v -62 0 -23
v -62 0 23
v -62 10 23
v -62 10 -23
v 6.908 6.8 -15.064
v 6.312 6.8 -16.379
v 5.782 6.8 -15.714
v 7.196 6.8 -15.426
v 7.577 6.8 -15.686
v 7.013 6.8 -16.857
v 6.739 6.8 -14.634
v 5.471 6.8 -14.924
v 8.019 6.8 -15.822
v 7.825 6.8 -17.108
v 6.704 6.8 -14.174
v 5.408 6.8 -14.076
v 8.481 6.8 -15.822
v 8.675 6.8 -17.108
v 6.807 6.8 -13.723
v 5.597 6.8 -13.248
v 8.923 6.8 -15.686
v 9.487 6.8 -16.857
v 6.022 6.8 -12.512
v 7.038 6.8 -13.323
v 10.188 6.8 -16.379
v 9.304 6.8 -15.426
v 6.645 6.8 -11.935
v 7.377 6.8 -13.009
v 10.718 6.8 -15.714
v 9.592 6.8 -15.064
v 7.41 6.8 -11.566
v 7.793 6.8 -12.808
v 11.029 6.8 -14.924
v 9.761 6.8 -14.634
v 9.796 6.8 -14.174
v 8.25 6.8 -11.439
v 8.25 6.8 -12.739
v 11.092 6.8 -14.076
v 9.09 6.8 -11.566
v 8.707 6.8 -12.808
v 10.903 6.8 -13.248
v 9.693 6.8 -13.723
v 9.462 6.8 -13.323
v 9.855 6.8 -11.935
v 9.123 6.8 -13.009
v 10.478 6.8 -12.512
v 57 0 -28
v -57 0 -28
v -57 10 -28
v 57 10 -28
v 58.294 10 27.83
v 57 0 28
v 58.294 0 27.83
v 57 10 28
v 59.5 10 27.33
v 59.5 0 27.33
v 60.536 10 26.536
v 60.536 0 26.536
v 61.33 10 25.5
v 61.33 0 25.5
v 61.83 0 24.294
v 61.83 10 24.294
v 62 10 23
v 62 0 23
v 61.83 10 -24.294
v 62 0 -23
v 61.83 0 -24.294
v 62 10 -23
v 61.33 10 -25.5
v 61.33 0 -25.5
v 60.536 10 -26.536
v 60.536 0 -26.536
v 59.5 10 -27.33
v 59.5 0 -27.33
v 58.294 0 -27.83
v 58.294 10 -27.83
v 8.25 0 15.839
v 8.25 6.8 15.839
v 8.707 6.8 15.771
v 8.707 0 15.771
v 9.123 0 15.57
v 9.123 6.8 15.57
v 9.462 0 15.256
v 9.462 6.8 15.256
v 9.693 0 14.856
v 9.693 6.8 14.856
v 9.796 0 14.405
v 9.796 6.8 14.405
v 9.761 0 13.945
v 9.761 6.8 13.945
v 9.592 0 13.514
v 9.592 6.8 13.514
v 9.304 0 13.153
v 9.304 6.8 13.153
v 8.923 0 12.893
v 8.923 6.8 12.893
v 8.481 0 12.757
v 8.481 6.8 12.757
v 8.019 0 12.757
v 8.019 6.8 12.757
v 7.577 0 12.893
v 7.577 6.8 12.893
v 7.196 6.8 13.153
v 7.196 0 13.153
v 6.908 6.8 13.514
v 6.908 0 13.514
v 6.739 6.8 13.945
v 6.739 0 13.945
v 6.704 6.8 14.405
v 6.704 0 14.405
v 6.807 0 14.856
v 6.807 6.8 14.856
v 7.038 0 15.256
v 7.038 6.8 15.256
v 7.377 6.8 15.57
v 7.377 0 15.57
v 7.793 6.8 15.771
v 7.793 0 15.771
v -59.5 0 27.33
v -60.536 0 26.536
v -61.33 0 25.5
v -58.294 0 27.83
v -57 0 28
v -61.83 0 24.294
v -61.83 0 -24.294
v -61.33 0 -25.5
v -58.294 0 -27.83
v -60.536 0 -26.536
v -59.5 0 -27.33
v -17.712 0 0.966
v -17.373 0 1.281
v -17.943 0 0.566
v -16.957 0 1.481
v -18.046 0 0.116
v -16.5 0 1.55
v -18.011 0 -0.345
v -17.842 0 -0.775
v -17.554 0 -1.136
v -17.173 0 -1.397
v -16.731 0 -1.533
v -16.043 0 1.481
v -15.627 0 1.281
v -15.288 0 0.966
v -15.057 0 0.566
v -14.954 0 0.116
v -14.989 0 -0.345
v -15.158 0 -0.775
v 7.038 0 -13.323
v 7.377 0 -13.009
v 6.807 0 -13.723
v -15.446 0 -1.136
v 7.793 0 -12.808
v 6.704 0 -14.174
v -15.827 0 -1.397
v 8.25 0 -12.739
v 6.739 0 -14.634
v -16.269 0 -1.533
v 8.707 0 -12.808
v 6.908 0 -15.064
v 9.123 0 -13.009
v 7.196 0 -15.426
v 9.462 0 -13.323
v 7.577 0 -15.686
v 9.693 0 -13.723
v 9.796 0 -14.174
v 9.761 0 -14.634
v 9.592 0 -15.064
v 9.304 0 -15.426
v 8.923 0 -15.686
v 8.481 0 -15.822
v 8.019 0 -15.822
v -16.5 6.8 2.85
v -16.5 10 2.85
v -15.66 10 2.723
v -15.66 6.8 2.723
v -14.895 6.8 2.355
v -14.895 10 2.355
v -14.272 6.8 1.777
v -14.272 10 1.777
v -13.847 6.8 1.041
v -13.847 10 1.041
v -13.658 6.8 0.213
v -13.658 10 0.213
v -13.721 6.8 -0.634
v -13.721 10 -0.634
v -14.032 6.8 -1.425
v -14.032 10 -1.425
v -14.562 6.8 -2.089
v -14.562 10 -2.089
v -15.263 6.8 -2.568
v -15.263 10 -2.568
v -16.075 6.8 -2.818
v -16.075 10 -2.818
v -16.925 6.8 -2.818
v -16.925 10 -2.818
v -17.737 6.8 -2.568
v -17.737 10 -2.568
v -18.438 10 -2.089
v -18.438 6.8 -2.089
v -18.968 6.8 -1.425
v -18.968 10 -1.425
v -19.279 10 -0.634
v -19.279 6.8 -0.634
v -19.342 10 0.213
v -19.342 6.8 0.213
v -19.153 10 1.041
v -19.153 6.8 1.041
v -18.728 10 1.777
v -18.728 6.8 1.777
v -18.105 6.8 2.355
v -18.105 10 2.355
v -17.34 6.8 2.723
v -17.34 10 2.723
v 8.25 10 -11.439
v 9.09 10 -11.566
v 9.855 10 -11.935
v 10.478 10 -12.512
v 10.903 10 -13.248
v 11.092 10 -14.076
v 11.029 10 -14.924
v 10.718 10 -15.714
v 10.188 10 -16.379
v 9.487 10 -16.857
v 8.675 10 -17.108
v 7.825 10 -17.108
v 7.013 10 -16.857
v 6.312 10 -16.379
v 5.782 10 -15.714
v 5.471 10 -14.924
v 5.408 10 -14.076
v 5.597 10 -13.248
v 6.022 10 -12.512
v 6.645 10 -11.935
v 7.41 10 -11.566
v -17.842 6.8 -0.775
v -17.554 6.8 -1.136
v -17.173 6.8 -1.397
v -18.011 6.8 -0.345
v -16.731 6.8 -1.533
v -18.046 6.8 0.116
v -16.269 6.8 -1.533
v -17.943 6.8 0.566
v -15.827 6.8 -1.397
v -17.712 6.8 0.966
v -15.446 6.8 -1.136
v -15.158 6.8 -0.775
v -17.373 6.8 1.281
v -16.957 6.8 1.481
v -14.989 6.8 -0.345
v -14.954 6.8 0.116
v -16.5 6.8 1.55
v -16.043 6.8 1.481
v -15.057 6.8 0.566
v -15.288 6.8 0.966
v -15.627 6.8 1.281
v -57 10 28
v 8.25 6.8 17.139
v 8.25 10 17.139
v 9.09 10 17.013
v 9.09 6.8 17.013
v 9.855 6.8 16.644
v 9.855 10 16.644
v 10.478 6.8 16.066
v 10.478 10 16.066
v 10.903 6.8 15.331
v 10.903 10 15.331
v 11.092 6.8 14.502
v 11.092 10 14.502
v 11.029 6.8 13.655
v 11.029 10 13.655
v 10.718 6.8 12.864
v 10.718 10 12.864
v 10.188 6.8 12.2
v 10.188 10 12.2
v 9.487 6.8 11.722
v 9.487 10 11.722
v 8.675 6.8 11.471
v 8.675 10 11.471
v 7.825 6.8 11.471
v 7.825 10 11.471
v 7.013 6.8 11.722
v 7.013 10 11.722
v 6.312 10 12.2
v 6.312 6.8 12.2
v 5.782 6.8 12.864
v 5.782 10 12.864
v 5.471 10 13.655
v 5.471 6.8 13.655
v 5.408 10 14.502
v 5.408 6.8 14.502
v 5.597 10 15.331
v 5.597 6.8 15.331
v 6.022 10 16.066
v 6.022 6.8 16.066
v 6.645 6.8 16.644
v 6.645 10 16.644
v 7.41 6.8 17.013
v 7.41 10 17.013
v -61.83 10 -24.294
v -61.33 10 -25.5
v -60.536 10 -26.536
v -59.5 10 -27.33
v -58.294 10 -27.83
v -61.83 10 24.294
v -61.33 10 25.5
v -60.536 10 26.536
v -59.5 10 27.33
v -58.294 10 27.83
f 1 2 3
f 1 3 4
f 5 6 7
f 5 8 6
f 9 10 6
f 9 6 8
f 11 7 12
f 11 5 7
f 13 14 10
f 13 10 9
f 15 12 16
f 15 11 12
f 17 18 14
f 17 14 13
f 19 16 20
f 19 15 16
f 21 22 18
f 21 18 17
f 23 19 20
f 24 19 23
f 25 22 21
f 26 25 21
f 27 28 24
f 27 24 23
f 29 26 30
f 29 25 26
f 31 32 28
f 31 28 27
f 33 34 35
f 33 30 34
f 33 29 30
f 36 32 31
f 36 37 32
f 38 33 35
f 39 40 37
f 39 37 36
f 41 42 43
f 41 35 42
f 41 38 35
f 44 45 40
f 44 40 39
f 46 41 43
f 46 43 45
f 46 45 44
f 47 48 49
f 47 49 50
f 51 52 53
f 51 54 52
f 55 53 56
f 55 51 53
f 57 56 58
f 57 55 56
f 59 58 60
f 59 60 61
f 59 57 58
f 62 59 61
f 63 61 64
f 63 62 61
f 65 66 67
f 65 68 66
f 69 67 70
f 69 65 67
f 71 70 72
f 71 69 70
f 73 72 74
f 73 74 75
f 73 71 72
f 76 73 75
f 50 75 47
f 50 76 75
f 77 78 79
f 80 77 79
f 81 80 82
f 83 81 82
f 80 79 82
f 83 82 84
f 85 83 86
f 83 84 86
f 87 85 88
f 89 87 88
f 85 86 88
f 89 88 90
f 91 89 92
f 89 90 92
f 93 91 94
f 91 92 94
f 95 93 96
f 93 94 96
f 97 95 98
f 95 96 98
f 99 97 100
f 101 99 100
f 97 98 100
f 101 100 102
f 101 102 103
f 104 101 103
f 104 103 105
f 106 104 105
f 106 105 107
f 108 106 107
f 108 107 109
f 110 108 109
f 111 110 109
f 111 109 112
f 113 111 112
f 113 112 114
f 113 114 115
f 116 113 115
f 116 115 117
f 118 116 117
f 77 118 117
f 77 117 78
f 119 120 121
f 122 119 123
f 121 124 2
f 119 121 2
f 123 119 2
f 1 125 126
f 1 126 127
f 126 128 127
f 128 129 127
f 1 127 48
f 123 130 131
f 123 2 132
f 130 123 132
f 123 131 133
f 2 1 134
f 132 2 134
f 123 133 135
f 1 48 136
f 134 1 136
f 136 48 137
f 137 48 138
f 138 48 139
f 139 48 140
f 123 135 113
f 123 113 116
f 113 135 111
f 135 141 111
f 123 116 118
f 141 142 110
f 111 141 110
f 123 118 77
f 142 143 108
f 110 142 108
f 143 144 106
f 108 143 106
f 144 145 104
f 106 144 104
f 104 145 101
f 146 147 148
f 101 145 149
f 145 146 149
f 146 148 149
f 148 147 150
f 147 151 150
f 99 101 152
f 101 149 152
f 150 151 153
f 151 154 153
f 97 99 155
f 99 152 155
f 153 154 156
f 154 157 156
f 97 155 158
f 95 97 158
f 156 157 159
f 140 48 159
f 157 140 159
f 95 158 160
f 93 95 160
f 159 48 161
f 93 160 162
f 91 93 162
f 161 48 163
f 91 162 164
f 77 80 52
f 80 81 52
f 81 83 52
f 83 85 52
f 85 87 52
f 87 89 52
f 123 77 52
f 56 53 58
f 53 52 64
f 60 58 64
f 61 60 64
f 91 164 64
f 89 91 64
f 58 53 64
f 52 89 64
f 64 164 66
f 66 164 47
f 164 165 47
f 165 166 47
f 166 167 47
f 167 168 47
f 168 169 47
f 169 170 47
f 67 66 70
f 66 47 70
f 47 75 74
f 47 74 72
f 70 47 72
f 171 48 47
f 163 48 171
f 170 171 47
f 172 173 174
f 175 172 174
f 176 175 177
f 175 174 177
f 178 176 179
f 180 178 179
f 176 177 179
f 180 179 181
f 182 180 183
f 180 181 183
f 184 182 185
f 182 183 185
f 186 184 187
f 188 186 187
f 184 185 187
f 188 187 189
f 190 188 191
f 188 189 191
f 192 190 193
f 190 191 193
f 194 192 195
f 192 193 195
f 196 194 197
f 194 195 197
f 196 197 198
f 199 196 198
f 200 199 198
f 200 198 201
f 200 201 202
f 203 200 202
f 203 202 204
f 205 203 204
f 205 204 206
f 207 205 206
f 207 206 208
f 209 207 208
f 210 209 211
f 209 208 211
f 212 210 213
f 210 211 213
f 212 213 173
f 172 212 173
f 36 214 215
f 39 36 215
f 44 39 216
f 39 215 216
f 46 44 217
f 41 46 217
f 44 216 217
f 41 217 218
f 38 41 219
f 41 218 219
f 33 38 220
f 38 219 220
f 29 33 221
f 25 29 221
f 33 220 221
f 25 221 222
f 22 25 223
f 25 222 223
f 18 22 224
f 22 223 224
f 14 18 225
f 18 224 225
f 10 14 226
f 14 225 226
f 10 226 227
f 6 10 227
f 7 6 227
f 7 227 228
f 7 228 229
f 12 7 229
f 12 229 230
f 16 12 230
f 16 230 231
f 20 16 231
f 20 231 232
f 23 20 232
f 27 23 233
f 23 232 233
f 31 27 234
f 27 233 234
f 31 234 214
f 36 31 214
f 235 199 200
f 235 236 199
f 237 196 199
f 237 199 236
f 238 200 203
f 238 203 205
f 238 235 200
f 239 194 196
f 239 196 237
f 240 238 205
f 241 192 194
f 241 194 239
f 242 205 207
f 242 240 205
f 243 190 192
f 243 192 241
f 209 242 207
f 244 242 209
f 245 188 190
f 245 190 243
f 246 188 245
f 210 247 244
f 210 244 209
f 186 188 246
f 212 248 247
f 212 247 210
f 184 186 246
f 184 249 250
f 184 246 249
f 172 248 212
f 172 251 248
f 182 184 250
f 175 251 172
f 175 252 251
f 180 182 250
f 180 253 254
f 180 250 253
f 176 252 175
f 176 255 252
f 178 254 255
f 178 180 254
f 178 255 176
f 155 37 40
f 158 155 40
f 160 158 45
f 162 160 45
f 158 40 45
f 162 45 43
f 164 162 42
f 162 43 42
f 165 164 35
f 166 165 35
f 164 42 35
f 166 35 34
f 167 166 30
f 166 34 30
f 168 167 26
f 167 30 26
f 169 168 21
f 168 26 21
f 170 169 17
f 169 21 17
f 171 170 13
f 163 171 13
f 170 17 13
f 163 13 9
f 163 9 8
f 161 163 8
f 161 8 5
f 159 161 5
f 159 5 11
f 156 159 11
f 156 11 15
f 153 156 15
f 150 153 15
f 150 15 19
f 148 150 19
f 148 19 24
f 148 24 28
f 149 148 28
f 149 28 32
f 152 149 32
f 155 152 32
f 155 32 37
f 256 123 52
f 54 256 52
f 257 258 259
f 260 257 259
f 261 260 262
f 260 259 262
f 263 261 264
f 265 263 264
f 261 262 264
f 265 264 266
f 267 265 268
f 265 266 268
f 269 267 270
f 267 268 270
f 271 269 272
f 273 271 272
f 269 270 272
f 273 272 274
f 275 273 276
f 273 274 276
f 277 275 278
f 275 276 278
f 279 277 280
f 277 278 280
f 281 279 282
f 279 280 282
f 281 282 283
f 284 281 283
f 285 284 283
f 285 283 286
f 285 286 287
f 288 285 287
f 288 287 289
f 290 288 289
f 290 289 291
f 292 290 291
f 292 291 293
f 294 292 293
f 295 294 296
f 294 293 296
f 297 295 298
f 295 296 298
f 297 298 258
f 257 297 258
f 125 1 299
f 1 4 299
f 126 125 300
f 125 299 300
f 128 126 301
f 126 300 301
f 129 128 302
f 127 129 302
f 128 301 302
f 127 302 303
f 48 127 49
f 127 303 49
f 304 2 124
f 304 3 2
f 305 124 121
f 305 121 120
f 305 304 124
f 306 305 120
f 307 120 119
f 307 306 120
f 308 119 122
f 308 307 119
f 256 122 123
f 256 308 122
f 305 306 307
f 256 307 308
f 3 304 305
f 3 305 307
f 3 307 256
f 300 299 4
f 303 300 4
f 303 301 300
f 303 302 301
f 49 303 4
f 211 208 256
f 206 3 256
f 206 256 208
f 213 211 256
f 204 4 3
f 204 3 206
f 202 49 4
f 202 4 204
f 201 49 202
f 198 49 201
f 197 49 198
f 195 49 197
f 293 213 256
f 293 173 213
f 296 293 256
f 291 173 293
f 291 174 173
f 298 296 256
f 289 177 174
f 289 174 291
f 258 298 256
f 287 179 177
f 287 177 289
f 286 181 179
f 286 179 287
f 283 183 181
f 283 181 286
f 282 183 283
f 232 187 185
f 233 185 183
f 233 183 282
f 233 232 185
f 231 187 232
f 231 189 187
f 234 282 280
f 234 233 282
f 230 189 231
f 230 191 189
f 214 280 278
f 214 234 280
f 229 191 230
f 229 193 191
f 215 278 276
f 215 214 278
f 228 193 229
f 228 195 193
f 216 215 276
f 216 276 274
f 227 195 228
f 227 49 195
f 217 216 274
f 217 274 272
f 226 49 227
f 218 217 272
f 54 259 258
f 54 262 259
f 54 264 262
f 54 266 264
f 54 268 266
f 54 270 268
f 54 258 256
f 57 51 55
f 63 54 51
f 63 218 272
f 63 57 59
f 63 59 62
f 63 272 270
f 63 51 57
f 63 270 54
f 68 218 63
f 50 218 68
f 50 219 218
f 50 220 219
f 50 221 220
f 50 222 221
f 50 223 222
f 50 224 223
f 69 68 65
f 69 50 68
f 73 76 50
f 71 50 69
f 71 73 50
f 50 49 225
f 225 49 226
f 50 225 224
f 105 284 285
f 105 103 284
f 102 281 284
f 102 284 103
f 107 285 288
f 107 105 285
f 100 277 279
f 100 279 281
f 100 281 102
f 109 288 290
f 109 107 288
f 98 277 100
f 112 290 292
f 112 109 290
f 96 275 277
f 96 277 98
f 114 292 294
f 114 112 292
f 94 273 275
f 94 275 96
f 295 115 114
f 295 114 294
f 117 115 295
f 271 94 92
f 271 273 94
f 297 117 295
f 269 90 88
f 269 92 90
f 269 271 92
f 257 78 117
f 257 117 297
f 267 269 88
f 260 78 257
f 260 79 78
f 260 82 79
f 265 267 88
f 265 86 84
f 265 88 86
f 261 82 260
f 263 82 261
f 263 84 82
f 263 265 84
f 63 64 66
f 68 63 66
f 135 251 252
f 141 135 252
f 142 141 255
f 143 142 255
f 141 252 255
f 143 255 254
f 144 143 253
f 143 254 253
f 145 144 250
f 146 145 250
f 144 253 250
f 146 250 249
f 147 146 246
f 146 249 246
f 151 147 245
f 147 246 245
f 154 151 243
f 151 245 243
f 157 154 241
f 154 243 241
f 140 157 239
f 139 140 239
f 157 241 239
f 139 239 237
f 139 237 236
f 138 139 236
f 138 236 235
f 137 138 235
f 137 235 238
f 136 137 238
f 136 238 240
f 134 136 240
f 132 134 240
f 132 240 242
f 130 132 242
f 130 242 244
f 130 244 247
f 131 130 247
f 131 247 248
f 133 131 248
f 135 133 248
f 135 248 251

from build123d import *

# Parameters (mm, degrees)
SKIZZE1_W                       = 124
SKIZZE1_H                       = 56
AUFSATZ_LINEAR_AUSTRAGEN1_DEPTH = 10
VERRUNDUNG1_R                   = 5
SCHNITT_LINEAR_AUSTRAGEN1_REACH = 70.76
SKIZZE2_R                       = 1.55
SKIZZE3_R                       = 2.85
SCHNITT_LINEAR_AUSTRAGEN2_DEPTH = 3.2


with BuildPart() as part:
    # Skizze1 → Aufsatz-Linear austragen1 (new body)
    with BuildSketch(Plane(origin=(0, 0, 0), x_dir=(1, 0, 0), z_dir=(0, 1, 0))):
        Rectangle(SKIZZE1_W, SKIZZE1_H)
    extrude(amount=AUFSATZ_LINEAR_AUSTRAGEN1_DEPTH)

    # Verrundung1
    verrundung1_edges = [part.edges().sort_by_distance(p)[0] for p in [
        (62, 5, -28),
        (62, 5, 28),
        (-62, 5, 28),
        (-62, 5, -28),
    ]]
    fillet(verrundung1_edges, radius=VERRUNDUNG1_R)

    # Skizze2 → Schnitt-Linear austragen1 (cut, up to next)
    with BuildSketch(Plane(origin=(0, 10, 0), x_dir=(1, 0, 0), z_dir=(0, 1, 0)), mode=Mode.PRIVATE) as schnitt_linear_austragen1_sk1:
        with Locations(Location((-16.5, 0, 0), (0, 0, 270))):
            Circle(SKIZZE2_R)
    schnitt_linear_austragen1_tool1 = extrude(schnitt_linear_austragen1_sk1.sketch, amount=-SCHNITT_LINEAR_AUSTRAGEN1_REACH, mode=Mode.PRIVATE) & part.part
    # Skizze2 → Schnitt-Linear austragen1 (cut, up to next)
    with BuildSketch(Plane(origin=(0, 10, 0), x_dir=(1, 0, 0), z_dir=(0, 1, 0)), mode=Mode.PRIVATE) as schnitt_linear_austragen1_sk2:
        with Locations(Location((8.25, 14.289419162, 0), (0, 0, 270))):
            Circle(SKIZZE2_R)
    schnitt_linear_austragen1_tool2 = extrude(schnitt_linear_austragen1_sk2.sketch, amount=-SCHNITT_LINEAR_AUSTRAGEN1_REACH, mode=Mode.PRIVATE) & part.part
    # Skizze2 → Schnitt-Linear austragen1 (cut, up to next)
    with BuildSketch(Plane(origin=(0, 10, 0), x_dir=(1, 0, 0), z_dir=(0, 1, 0)), mode=Mode.PRIVATE) as schnitt_linear_austragen1_sk3:
        with Locations(Location((8.25, -14.289419162, 0), (0, 0, 270))):
            Circle(SKIZZE2_R)
    schnitt_linear_austragen1_tool3 = extrude(schnitt_linear_austragen1_sk3.sketch, amount=-SCHNITT_LINEAR_AUSTRAGEN1_REACH, mode=Mode.PRIVATE) & part.part
    add(schnitt_linear_austragen1_tool1.solids().sort_by_distance((-16.5, 10, 0))[0], mode=Mode.SUBTRACT)
    add(schnitt_linear_austragen1_tool2.solids().sort_by_distance((8.25, 10, -14.289419))[0], mode=Mode.SUBTRACT)
    add(schnitt_linear_austragen1_tool3.solids().sort_by_distance((8.25, 10, 14.289419))[0], mode=Mode.SUBTRACT)

    # Skizze3 → Schnitt-Linear austragen2 (cut)
    with BuildSketch(Plane(origin=(0, 10, 0), x_dir=(1, 0, 0), z_dir=(0, 1, 0))):
        with Locations(Location((8.25, 14.289419162, 0), (0, 0, 270))):
            Circle(SKIZZE3_R)
        with Locations(Location((-16.5, 0, 0), (0, 0, 270))):
            Circle(SKIZZE3_R)
        with Locations(Location((8.25, -14.289419162, 0), (0, 0, 270))):
            Circle(SKIZZE3_R)
    extrude(amount=-SCHNITT_LINEAR_AUSTRAGEN2_DEPTH, mode=Mode.SUBTRACT)


solid = part.part
